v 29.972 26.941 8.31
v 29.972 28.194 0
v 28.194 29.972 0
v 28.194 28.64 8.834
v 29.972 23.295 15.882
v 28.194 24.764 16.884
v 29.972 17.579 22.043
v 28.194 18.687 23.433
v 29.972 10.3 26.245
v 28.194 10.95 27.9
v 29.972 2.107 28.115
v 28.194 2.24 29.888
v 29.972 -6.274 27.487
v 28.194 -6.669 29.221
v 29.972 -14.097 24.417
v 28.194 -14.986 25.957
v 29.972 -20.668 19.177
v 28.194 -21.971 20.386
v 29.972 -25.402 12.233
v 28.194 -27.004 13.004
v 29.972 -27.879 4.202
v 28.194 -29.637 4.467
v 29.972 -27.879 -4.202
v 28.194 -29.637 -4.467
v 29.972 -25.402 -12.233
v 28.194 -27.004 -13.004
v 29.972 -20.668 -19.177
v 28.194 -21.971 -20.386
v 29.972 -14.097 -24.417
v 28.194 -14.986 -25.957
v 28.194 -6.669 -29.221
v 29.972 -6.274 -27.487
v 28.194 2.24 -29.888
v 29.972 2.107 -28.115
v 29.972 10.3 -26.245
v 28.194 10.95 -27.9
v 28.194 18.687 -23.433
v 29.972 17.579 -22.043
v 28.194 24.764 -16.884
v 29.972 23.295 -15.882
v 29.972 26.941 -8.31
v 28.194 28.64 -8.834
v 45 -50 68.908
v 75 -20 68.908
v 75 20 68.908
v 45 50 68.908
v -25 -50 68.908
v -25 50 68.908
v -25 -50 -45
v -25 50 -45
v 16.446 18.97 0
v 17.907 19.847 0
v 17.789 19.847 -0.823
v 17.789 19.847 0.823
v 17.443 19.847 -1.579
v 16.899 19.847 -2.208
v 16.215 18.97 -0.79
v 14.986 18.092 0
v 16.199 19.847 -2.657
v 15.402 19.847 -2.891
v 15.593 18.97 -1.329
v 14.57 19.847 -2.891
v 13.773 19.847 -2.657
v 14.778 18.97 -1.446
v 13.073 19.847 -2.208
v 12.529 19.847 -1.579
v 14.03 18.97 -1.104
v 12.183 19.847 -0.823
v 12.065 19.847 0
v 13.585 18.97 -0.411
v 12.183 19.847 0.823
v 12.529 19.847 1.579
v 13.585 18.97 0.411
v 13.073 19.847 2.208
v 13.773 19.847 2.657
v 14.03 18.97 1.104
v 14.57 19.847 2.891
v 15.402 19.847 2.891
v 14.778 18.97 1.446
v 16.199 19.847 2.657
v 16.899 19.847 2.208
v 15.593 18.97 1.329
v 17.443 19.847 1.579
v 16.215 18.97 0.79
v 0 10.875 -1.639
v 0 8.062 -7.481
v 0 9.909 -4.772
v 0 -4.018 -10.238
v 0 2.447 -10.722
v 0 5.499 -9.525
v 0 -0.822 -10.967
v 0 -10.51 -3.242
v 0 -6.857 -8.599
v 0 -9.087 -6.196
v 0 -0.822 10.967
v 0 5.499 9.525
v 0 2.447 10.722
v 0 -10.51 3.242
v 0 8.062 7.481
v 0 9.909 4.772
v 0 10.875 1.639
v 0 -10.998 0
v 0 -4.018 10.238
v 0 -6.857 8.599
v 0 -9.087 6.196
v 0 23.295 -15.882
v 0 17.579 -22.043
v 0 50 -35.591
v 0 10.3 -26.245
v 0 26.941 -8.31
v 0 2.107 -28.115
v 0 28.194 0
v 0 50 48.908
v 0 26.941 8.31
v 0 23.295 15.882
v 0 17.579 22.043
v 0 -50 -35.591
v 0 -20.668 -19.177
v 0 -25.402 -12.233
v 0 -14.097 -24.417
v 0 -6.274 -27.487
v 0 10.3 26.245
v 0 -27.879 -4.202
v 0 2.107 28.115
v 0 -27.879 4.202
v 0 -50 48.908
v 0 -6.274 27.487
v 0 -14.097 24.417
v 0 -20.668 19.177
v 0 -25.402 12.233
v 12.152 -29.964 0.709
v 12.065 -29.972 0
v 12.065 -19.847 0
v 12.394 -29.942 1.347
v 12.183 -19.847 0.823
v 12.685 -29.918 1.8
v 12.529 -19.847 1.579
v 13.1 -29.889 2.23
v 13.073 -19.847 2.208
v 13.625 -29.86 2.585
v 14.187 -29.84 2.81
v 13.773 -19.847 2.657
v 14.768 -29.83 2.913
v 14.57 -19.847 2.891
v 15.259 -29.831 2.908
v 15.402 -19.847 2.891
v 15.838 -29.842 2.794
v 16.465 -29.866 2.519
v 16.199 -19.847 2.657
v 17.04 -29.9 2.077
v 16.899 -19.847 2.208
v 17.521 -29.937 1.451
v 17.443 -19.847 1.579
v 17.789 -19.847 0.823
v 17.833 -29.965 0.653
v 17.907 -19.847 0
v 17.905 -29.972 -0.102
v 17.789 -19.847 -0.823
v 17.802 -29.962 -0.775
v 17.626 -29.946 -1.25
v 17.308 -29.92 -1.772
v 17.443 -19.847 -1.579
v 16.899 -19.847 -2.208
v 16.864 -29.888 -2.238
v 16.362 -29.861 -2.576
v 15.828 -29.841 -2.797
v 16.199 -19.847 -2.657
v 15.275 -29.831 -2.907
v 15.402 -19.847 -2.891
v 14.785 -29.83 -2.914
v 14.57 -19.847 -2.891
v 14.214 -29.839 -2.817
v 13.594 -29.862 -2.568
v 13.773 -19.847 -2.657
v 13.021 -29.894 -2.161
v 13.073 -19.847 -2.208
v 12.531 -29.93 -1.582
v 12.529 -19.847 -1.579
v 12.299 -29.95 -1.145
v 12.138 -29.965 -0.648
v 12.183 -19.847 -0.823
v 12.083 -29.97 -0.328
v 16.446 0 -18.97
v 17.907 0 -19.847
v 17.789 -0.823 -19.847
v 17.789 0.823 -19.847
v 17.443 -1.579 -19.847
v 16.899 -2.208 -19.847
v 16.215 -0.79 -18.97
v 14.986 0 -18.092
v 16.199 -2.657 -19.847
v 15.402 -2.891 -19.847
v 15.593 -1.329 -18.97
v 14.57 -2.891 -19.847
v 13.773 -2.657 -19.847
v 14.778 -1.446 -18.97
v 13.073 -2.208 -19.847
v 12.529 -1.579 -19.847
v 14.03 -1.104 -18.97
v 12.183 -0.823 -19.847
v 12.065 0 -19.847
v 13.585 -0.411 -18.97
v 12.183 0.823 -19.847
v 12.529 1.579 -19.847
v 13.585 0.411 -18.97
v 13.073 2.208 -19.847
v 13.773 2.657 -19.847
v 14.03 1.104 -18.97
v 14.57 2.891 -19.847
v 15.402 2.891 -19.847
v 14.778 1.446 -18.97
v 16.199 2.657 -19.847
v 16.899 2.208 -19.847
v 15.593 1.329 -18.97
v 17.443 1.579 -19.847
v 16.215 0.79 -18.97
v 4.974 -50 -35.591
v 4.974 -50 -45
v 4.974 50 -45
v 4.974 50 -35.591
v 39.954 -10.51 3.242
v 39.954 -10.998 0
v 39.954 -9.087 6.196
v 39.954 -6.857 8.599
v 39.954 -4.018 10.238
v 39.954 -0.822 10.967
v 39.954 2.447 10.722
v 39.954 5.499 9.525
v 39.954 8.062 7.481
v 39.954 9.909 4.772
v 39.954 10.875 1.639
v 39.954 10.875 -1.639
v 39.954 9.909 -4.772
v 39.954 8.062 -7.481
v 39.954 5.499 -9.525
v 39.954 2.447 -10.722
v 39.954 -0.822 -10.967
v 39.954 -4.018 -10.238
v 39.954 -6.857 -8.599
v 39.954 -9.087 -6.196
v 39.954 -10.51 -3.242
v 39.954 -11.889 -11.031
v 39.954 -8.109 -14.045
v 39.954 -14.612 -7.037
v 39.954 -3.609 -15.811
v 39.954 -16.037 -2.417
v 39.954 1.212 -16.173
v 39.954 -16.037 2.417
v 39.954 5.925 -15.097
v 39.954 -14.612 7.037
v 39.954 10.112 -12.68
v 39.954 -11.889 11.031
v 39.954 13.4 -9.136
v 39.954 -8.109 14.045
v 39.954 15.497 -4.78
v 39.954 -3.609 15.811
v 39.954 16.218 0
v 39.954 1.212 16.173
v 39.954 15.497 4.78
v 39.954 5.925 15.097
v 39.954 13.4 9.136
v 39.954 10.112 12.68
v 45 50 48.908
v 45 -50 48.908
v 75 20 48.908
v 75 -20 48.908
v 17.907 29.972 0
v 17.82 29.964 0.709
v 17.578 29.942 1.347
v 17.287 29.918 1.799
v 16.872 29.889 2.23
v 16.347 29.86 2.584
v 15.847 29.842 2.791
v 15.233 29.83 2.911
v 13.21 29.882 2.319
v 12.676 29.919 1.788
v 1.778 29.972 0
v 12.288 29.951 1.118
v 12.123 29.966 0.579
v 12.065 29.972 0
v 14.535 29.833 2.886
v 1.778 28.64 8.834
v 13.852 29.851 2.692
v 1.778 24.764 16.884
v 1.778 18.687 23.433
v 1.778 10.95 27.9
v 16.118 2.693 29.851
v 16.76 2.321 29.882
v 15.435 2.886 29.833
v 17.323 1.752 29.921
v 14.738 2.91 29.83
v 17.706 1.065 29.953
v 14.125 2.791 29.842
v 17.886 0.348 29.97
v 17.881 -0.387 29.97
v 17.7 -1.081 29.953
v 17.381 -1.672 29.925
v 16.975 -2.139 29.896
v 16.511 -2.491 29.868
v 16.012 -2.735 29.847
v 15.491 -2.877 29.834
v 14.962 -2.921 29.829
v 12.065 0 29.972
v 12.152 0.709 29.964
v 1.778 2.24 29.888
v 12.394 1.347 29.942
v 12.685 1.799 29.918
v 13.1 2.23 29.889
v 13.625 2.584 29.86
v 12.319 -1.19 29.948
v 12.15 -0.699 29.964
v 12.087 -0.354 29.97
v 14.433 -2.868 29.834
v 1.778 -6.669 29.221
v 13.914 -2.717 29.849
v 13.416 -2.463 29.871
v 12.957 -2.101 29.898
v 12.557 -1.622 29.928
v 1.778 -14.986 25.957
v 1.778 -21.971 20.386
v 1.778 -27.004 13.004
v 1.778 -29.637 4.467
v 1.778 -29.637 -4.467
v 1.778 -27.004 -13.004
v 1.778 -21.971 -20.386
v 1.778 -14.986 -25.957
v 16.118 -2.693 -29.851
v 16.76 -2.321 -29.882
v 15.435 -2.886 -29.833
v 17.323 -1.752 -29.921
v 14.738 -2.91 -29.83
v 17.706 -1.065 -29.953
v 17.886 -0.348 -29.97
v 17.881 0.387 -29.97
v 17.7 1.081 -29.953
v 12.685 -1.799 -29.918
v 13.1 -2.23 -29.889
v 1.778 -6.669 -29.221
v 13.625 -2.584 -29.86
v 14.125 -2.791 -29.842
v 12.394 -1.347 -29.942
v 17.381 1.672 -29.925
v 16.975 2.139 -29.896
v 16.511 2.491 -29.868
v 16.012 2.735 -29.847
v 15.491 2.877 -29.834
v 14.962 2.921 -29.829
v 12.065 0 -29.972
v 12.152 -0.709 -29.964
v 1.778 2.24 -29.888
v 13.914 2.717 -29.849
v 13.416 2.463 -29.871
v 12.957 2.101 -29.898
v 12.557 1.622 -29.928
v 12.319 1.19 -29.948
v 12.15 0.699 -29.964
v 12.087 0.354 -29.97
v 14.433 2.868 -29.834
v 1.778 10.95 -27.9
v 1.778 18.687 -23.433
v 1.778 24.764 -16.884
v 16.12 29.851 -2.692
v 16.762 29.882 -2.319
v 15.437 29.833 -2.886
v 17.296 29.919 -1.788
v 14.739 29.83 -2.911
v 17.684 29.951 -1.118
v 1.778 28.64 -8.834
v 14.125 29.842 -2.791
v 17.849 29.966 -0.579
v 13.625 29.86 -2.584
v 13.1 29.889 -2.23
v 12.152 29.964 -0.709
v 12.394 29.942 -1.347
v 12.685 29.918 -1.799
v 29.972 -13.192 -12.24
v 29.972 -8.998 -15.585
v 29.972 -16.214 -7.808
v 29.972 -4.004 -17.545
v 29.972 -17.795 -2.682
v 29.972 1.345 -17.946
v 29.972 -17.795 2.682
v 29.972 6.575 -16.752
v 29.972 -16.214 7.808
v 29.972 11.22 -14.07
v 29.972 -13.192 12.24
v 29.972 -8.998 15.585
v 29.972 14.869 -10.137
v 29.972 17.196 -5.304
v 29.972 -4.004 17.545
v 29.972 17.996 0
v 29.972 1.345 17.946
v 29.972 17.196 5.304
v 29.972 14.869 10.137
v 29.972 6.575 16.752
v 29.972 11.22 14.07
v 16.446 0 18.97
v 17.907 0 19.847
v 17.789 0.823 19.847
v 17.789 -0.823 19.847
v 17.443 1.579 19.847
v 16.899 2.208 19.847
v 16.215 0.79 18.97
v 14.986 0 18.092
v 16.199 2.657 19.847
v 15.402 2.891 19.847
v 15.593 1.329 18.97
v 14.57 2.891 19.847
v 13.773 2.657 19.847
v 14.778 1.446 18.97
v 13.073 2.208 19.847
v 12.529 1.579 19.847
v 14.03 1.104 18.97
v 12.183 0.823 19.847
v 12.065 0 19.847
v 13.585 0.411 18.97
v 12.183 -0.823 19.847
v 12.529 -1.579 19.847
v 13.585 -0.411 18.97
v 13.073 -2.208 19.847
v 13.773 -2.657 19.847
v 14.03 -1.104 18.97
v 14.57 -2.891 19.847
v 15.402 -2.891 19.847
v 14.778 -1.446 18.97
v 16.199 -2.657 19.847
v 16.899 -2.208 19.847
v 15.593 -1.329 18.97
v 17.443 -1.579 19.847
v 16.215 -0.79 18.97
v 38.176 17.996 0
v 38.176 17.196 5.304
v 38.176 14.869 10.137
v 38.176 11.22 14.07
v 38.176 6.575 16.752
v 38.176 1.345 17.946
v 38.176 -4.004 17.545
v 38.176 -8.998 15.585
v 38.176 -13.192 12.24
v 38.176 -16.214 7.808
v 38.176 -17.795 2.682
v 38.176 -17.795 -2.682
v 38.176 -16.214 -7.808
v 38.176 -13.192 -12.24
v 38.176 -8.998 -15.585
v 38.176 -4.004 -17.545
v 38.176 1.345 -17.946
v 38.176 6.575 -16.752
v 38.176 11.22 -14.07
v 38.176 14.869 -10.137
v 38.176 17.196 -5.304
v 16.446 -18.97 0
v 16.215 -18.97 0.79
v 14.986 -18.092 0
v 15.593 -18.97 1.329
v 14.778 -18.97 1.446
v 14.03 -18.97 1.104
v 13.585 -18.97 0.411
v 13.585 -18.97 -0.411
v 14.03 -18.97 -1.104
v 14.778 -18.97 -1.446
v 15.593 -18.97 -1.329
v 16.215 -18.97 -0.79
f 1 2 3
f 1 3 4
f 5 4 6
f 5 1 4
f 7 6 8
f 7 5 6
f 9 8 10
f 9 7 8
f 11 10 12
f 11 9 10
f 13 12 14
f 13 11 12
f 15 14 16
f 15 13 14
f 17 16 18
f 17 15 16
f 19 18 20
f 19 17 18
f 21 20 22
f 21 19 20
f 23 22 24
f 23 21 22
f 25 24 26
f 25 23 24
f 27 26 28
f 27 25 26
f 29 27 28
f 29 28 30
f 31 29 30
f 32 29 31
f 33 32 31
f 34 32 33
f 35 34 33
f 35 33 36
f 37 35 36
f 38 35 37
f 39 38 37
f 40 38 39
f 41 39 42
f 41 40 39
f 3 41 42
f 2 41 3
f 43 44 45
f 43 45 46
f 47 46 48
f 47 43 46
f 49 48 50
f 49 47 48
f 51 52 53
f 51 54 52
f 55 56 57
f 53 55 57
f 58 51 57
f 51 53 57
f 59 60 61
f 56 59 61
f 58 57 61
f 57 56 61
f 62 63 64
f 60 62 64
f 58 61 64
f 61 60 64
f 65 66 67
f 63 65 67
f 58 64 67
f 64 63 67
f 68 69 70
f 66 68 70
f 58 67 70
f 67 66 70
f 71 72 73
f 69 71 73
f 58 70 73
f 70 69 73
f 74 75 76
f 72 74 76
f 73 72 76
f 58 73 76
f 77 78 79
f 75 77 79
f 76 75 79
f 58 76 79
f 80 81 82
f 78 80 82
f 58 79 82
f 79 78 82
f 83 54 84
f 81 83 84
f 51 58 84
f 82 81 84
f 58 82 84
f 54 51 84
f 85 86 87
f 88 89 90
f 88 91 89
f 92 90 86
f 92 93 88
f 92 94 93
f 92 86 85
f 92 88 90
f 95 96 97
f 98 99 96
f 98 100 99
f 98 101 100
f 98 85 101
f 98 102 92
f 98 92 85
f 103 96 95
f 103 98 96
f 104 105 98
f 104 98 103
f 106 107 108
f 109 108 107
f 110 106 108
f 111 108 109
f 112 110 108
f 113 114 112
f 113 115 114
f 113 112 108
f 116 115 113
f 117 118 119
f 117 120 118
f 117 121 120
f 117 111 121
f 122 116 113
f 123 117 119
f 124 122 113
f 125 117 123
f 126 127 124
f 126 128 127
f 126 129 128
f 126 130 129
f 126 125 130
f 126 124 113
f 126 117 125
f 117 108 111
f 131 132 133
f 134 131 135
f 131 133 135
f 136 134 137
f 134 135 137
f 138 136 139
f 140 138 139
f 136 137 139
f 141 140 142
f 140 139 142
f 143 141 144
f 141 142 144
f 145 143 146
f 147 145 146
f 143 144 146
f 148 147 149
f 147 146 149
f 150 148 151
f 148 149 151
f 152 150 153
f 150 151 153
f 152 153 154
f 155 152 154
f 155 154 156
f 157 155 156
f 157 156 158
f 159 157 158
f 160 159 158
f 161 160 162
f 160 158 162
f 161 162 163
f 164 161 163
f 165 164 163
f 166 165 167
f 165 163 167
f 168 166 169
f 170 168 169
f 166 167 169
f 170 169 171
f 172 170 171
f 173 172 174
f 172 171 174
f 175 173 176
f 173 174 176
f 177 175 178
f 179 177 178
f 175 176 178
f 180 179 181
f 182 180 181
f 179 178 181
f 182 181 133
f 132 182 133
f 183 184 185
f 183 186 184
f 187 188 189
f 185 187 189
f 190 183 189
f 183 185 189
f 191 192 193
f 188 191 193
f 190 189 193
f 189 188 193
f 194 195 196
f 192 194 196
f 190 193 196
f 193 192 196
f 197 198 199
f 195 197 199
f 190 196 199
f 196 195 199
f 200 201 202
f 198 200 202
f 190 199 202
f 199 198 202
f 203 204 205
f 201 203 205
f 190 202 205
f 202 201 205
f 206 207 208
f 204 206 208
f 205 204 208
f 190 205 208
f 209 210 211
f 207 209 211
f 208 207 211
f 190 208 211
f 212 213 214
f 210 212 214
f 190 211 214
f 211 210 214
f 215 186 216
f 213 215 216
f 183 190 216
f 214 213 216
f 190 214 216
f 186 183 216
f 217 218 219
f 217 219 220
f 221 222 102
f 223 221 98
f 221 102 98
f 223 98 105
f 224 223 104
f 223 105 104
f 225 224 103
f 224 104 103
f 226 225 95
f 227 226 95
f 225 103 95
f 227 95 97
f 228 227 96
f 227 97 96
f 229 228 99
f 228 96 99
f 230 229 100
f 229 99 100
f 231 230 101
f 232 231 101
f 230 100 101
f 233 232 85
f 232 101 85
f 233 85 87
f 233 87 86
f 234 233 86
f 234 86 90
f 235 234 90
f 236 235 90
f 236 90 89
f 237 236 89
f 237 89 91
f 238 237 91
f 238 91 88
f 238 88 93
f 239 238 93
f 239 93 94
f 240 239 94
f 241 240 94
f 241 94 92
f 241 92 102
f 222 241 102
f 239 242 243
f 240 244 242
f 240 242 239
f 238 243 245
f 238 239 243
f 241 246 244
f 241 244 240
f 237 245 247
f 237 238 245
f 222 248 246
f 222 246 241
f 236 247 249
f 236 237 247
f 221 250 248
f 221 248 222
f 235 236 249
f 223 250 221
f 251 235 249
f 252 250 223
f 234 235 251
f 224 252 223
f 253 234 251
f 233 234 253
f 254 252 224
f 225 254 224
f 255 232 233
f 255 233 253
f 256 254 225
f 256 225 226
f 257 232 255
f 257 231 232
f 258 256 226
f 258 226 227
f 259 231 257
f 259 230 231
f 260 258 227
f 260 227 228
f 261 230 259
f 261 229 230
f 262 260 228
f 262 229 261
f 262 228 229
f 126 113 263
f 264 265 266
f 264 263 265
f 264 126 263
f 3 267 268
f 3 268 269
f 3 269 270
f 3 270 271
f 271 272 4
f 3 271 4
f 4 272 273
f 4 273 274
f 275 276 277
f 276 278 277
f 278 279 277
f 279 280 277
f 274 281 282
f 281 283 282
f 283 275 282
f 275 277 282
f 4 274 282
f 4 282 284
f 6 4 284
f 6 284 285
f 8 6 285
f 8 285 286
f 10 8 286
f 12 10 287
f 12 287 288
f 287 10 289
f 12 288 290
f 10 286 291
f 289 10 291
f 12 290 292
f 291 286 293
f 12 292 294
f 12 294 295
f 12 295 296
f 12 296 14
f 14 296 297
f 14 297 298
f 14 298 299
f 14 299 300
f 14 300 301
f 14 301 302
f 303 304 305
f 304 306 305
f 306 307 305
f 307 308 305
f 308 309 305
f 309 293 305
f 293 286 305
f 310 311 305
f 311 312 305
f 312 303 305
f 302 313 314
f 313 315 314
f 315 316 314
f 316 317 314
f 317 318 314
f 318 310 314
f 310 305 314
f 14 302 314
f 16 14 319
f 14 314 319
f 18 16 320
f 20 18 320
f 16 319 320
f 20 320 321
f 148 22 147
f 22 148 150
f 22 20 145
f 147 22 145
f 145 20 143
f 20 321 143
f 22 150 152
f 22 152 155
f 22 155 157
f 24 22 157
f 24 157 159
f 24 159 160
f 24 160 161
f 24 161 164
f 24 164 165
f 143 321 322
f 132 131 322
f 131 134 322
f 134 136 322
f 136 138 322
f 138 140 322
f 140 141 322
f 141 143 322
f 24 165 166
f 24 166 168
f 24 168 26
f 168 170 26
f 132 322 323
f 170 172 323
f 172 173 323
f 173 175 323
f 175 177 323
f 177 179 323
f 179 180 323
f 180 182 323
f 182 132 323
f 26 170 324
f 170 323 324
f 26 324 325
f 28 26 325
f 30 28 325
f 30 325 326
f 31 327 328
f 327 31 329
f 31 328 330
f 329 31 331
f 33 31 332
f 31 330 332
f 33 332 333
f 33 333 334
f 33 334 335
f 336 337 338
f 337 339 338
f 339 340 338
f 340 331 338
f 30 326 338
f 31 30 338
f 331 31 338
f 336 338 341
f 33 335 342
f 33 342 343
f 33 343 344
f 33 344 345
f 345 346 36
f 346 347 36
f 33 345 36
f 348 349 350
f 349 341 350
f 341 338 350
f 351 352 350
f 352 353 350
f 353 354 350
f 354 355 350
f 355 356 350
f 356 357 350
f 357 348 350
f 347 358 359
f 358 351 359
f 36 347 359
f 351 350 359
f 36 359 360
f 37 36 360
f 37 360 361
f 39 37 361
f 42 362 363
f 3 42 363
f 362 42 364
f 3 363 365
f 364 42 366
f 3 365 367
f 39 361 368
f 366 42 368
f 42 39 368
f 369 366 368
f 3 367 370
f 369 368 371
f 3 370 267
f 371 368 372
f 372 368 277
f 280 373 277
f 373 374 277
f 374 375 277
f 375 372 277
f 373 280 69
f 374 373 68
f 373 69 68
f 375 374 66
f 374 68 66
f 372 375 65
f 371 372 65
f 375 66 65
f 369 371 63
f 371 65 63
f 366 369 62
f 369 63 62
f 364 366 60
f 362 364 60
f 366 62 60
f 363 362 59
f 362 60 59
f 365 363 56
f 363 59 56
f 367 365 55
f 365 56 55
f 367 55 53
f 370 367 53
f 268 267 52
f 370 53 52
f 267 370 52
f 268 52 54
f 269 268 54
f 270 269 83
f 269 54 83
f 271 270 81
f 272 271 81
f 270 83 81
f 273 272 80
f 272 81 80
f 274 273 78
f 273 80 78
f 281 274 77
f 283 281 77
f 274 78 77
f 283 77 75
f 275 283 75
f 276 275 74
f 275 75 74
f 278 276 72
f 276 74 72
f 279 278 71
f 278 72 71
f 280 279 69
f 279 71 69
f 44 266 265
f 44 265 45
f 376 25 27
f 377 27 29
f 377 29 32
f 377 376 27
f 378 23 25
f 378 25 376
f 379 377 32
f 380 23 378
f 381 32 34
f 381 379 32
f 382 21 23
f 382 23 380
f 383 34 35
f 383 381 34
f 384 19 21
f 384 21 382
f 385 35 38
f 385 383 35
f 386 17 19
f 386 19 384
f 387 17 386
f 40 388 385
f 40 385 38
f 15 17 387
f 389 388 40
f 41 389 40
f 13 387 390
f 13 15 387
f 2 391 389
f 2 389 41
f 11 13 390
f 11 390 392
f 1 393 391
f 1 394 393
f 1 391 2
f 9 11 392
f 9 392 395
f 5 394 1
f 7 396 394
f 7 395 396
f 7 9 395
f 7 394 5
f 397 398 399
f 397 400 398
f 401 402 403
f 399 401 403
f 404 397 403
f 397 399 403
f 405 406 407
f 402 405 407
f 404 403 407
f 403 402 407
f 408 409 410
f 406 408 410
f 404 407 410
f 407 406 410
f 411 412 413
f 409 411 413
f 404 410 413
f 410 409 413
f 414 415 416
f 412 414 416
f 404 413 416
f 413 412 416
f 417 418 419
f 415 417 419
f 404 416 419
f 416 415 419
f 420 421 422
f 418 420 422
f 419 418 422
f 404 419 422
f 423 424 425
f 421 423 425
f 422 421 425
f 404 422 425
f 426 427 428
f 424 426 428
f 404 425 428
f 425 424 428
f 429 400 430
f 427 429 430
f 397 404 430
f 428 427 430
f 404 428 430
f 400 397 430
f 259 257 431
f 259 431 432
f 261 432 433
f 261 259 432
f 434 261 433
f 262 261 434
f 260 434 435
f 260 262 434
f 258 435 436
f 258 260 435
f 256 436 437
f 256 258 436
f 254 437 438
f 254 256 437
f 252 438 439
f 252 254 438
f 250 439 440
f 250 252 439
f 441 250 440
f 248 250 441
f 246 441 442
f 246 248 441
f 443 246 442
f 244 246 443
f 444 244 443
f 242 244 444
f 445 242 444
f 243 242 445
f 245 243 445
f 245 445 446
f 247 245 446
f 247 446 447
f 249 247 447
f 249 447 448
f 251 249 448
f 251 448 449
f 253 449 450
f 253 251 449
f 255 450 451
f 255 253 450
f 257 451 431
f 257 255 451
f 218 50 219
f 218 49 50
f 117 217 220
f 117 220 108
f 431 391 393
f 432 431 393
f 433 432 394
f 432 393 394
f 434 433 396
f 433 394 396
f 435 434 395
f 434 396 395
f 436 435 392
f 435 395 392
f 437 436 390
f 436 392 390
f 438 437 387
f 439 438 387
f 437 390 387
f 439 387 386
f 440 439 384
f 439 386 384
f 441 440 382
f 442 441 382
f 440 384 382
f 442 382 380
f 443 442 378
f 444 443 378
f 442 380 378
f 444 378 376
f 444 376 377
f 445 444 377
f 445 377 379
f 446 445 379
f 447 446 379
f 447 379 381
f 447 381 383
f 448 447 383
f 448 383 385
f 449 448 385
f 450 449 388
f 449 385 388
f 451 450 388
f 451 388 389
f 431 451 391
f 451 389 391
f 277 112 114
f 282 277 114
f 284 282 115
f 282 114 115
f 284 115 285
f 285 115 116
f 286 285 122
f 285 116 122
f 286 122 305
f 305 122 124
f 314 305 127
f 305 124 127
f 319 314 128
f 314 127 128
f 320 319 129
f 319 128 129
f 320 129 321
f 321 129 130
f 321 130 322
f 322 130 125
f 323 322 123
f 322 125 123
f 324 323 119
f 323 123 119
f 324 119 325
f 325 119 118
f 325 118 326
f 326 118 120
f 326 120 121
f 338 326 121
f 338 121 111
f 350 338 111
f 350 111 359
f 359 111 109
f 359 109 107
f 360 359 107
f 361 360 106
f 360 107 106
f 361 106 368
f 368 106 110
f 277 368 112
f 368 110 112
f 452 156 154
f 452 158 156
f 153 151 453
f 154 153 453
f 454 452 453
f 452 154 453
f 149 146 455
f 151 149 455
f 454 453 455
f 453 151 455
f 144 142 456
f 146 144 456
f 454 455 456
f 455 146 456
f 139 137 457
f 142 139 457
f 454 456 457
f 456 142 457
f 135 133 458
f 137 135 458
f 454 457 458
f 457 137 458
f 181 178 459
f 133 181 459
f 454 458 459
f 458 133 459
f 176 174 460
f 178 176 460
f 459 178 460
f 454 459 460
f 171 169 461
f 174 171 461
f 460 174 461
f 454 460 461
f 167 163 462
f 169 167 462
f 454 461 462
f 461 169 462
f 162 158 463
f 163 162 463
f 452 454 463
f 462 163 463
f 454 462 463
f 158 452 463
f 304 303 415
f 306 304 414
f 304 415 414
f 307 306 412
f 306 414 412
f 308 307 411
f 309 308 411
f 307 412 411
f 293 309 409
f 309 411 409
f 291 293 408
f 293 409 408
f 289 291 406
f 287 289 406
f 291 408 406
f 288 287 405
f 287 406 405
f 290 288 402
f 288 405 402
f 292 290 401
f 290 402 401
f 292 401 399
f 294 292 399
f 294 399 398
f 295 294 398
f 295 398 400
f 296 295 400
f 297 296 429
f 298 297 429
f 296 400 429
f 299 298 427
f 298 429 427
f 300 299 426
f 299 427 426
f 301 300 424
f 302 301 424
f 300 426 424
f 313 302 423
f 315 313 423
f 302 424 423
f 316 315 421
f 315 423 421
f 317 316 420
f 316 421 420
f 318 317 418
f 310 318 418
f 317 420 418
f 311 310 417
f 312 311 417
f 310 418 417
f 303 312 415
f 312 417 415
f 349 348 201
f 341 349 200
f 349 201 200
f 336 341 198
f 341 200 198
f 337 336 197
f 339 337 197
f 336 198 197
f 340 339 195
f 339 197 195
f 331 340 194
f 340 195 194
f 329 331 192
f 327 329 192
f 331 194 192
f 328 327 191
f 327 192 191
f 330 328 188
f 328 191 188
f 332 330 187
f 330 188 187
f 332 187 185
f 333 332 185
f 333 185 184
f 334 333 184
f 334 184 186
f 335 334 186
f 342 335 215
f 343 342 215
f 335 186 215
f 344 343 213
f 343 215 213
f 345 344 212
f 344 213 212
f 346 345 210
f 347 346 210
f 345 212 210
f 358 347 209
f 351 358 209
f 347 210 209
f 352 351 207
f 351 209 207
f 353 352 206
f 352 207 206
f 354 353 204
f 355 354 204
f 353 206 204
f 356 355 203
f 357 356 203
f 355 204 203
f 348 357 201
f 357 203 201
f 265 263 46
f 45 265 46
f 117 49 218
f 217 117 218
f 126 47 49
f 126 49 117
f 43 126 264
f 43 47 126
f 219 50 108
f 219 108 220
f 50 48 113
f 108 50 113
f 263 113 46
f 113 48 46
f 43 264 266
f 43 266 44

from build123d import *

# Parameters (mm, degrees)
F0_R      = 29.972
F1_DEPTH  = 29.972
F2_R      = 17.9959
F3_DEPTH  = 9.9822
F5_D      = 21.9964
F6_SIZE   = 1.778
F7_SIZE   = 1.778
F14_D     = 5.842
F14_DEPTH = 9.9822
F14_START = 0.1680766
F14_TIP   = 1.7551138682
F15_D     = 5.842
F15_DEPTH = 9.9822
F15_START = 0.1680766
F15_TIP   = 1.7551138682
F18_D     = 5.842
F18_DEPTH = 9.9822
F18_START = 0.1680766
F18_TIP   = 1.7551138682
F19_D     = 5.842
F19_DEPTH = 9.9822
F19_START = 0.1680766
F19_TIP   = 1.7551138682
F20_SIZE  = 1.778
F22_DEPTH = 50
F23_SIZE  = 30
F24_SIZE  = 30


with BuildPart() as f1:
    # F0 (on Right) → F1 (new body)
    with BuildSketch(Plane.YZ):
        Circle(F0_R)
    extrude(amount=F1_DEPTH)

    # F2 (on face) → F3 (join)
    with BuildSketch(Plane.YZ.offset(29.972)):
        Circle(F2_R)
    extrude(amount=F3_DEPTH)

    # F5 (through all)
    with Locations(Plane.YZ.offset(39.9542)):
        with Locations((0, 0)):
            Hole(F5_D / 2)

    # F6
    f6_edges = [f1.edges().sort_by_distance(p)[0] for p in [
        (0, -29.972, 0),
    ]]
    chamfer(f6_edges, length=F6_SIZE)

    # F7
    f7_edges = [f1.edges().sort_by_distance(p)[0] for p in [
        (29.972, -29.972, 0),
    ]]
    chamfer(f7_edges, length=F7_SIZE)

    # F14
    # its depths count from where the whole tool has entered the part; down to there all is cleared
    with Locations(Plane(origin=(0, 29.9974, 0), x_dir=(1, 0, 0), z_dir=(0, 1, 0)).offset(-F14_START)):
        with Locations((14.986, 0)):
            Hole(F14_D / 2, depth=F14_DEPTH)
            with Locations((0, 0, -(F14_DEPTH + F14_TIP / 2))):  # 118° drill point
                Cone(0, F14_D / 2, F14_TIP, mode=Mode.SUBTRACT)

    # F15
    # its depths count from where the whole tool has entered the part; down to there all is cleared
    with Locations(Plane.XZ.offset(29.9974).offset(-F15_START)):
        with Locations((14.986, 0)):
            Hole(F15_D / 2, depth=F15_DEPTH)
            with Locations((0, 0, -(F15_DEPTH + F15_TIP / 2))):  # 118° drill point
                Cone(0, F15_D / 2, F15_TIP, mode=Mode.SUBTRACT)

    # F18
    # its depths count from where the whole tool has entered the part; down to there all is cleared
    with Locations(Plane(origin=(0, 0, -29.9974), x_dir=(1, 0, 0), z_dir=(0, 0, -1)).offset(-F18_START)):
        with Locations((14.986, 0)):
            Hole(F18_D / 2, depth=F18_DEPTH)
            with Locations((0, 0, -(F18_DEPTH + F18_TIP / 2))):  # 118° drill point
                Cone(0, F18_D / 2, F18_TIP, mode=Mode.SUBTRACT)

    # F19
    # its depths count from where the whole tool has entered the part; down to there all is cleared
    with Locations(Plane.XY.offset(29.9974).offset(-F19_START)):
        with Locations((14.986, 0)):
            Hole(F19_D / 2, depth=F19_DEPTH)
            with Locations((0, 0, -(F19_DEPTH + F19_TIP / 2))):  # 118° drill point
                Cone(0, F19_D / 2, F19_TIP, mode=Mode.SUBTRACT)

    # F20
    f20_edges = [f1.edges().sort_by_distance(p)[0] for p in [
        (39.9542, -17.9959, 0),
    ]]
    chamfer(f20_edges, length=F20_SIZE)

    # F21 (on Front) → F22 (join, symmetric)
    with BuildSketch(Plane.XZ):
        Polygon((-25, -45), (0, -45), (4.9744802527, -45), (4.9744802527, -35.5912335217), (0, -35.5912335217), (0, 0), (0, 48.9084279899), (75, 48.9084279899), (75, 68.9084279899), (-25, 68.9084279899), align=None)
    extrude(amount=F22_DEPTH, both=True)

    # F23
    f23_edges = [f1.edges().sort_by_distance(p)[0] for p in [
        (75, -50, 58.908428),
    ]]
    chamfer(f23_edges, length=F23_SIZE)

    # F24
    f24_edges = [f1.edges().sort_by_distance(p)[0] for p in [
        (75, 50, 58.908428),
    ]]
    chamfer(f24_edges, length=F24_SIZE)


solid = f1.part
